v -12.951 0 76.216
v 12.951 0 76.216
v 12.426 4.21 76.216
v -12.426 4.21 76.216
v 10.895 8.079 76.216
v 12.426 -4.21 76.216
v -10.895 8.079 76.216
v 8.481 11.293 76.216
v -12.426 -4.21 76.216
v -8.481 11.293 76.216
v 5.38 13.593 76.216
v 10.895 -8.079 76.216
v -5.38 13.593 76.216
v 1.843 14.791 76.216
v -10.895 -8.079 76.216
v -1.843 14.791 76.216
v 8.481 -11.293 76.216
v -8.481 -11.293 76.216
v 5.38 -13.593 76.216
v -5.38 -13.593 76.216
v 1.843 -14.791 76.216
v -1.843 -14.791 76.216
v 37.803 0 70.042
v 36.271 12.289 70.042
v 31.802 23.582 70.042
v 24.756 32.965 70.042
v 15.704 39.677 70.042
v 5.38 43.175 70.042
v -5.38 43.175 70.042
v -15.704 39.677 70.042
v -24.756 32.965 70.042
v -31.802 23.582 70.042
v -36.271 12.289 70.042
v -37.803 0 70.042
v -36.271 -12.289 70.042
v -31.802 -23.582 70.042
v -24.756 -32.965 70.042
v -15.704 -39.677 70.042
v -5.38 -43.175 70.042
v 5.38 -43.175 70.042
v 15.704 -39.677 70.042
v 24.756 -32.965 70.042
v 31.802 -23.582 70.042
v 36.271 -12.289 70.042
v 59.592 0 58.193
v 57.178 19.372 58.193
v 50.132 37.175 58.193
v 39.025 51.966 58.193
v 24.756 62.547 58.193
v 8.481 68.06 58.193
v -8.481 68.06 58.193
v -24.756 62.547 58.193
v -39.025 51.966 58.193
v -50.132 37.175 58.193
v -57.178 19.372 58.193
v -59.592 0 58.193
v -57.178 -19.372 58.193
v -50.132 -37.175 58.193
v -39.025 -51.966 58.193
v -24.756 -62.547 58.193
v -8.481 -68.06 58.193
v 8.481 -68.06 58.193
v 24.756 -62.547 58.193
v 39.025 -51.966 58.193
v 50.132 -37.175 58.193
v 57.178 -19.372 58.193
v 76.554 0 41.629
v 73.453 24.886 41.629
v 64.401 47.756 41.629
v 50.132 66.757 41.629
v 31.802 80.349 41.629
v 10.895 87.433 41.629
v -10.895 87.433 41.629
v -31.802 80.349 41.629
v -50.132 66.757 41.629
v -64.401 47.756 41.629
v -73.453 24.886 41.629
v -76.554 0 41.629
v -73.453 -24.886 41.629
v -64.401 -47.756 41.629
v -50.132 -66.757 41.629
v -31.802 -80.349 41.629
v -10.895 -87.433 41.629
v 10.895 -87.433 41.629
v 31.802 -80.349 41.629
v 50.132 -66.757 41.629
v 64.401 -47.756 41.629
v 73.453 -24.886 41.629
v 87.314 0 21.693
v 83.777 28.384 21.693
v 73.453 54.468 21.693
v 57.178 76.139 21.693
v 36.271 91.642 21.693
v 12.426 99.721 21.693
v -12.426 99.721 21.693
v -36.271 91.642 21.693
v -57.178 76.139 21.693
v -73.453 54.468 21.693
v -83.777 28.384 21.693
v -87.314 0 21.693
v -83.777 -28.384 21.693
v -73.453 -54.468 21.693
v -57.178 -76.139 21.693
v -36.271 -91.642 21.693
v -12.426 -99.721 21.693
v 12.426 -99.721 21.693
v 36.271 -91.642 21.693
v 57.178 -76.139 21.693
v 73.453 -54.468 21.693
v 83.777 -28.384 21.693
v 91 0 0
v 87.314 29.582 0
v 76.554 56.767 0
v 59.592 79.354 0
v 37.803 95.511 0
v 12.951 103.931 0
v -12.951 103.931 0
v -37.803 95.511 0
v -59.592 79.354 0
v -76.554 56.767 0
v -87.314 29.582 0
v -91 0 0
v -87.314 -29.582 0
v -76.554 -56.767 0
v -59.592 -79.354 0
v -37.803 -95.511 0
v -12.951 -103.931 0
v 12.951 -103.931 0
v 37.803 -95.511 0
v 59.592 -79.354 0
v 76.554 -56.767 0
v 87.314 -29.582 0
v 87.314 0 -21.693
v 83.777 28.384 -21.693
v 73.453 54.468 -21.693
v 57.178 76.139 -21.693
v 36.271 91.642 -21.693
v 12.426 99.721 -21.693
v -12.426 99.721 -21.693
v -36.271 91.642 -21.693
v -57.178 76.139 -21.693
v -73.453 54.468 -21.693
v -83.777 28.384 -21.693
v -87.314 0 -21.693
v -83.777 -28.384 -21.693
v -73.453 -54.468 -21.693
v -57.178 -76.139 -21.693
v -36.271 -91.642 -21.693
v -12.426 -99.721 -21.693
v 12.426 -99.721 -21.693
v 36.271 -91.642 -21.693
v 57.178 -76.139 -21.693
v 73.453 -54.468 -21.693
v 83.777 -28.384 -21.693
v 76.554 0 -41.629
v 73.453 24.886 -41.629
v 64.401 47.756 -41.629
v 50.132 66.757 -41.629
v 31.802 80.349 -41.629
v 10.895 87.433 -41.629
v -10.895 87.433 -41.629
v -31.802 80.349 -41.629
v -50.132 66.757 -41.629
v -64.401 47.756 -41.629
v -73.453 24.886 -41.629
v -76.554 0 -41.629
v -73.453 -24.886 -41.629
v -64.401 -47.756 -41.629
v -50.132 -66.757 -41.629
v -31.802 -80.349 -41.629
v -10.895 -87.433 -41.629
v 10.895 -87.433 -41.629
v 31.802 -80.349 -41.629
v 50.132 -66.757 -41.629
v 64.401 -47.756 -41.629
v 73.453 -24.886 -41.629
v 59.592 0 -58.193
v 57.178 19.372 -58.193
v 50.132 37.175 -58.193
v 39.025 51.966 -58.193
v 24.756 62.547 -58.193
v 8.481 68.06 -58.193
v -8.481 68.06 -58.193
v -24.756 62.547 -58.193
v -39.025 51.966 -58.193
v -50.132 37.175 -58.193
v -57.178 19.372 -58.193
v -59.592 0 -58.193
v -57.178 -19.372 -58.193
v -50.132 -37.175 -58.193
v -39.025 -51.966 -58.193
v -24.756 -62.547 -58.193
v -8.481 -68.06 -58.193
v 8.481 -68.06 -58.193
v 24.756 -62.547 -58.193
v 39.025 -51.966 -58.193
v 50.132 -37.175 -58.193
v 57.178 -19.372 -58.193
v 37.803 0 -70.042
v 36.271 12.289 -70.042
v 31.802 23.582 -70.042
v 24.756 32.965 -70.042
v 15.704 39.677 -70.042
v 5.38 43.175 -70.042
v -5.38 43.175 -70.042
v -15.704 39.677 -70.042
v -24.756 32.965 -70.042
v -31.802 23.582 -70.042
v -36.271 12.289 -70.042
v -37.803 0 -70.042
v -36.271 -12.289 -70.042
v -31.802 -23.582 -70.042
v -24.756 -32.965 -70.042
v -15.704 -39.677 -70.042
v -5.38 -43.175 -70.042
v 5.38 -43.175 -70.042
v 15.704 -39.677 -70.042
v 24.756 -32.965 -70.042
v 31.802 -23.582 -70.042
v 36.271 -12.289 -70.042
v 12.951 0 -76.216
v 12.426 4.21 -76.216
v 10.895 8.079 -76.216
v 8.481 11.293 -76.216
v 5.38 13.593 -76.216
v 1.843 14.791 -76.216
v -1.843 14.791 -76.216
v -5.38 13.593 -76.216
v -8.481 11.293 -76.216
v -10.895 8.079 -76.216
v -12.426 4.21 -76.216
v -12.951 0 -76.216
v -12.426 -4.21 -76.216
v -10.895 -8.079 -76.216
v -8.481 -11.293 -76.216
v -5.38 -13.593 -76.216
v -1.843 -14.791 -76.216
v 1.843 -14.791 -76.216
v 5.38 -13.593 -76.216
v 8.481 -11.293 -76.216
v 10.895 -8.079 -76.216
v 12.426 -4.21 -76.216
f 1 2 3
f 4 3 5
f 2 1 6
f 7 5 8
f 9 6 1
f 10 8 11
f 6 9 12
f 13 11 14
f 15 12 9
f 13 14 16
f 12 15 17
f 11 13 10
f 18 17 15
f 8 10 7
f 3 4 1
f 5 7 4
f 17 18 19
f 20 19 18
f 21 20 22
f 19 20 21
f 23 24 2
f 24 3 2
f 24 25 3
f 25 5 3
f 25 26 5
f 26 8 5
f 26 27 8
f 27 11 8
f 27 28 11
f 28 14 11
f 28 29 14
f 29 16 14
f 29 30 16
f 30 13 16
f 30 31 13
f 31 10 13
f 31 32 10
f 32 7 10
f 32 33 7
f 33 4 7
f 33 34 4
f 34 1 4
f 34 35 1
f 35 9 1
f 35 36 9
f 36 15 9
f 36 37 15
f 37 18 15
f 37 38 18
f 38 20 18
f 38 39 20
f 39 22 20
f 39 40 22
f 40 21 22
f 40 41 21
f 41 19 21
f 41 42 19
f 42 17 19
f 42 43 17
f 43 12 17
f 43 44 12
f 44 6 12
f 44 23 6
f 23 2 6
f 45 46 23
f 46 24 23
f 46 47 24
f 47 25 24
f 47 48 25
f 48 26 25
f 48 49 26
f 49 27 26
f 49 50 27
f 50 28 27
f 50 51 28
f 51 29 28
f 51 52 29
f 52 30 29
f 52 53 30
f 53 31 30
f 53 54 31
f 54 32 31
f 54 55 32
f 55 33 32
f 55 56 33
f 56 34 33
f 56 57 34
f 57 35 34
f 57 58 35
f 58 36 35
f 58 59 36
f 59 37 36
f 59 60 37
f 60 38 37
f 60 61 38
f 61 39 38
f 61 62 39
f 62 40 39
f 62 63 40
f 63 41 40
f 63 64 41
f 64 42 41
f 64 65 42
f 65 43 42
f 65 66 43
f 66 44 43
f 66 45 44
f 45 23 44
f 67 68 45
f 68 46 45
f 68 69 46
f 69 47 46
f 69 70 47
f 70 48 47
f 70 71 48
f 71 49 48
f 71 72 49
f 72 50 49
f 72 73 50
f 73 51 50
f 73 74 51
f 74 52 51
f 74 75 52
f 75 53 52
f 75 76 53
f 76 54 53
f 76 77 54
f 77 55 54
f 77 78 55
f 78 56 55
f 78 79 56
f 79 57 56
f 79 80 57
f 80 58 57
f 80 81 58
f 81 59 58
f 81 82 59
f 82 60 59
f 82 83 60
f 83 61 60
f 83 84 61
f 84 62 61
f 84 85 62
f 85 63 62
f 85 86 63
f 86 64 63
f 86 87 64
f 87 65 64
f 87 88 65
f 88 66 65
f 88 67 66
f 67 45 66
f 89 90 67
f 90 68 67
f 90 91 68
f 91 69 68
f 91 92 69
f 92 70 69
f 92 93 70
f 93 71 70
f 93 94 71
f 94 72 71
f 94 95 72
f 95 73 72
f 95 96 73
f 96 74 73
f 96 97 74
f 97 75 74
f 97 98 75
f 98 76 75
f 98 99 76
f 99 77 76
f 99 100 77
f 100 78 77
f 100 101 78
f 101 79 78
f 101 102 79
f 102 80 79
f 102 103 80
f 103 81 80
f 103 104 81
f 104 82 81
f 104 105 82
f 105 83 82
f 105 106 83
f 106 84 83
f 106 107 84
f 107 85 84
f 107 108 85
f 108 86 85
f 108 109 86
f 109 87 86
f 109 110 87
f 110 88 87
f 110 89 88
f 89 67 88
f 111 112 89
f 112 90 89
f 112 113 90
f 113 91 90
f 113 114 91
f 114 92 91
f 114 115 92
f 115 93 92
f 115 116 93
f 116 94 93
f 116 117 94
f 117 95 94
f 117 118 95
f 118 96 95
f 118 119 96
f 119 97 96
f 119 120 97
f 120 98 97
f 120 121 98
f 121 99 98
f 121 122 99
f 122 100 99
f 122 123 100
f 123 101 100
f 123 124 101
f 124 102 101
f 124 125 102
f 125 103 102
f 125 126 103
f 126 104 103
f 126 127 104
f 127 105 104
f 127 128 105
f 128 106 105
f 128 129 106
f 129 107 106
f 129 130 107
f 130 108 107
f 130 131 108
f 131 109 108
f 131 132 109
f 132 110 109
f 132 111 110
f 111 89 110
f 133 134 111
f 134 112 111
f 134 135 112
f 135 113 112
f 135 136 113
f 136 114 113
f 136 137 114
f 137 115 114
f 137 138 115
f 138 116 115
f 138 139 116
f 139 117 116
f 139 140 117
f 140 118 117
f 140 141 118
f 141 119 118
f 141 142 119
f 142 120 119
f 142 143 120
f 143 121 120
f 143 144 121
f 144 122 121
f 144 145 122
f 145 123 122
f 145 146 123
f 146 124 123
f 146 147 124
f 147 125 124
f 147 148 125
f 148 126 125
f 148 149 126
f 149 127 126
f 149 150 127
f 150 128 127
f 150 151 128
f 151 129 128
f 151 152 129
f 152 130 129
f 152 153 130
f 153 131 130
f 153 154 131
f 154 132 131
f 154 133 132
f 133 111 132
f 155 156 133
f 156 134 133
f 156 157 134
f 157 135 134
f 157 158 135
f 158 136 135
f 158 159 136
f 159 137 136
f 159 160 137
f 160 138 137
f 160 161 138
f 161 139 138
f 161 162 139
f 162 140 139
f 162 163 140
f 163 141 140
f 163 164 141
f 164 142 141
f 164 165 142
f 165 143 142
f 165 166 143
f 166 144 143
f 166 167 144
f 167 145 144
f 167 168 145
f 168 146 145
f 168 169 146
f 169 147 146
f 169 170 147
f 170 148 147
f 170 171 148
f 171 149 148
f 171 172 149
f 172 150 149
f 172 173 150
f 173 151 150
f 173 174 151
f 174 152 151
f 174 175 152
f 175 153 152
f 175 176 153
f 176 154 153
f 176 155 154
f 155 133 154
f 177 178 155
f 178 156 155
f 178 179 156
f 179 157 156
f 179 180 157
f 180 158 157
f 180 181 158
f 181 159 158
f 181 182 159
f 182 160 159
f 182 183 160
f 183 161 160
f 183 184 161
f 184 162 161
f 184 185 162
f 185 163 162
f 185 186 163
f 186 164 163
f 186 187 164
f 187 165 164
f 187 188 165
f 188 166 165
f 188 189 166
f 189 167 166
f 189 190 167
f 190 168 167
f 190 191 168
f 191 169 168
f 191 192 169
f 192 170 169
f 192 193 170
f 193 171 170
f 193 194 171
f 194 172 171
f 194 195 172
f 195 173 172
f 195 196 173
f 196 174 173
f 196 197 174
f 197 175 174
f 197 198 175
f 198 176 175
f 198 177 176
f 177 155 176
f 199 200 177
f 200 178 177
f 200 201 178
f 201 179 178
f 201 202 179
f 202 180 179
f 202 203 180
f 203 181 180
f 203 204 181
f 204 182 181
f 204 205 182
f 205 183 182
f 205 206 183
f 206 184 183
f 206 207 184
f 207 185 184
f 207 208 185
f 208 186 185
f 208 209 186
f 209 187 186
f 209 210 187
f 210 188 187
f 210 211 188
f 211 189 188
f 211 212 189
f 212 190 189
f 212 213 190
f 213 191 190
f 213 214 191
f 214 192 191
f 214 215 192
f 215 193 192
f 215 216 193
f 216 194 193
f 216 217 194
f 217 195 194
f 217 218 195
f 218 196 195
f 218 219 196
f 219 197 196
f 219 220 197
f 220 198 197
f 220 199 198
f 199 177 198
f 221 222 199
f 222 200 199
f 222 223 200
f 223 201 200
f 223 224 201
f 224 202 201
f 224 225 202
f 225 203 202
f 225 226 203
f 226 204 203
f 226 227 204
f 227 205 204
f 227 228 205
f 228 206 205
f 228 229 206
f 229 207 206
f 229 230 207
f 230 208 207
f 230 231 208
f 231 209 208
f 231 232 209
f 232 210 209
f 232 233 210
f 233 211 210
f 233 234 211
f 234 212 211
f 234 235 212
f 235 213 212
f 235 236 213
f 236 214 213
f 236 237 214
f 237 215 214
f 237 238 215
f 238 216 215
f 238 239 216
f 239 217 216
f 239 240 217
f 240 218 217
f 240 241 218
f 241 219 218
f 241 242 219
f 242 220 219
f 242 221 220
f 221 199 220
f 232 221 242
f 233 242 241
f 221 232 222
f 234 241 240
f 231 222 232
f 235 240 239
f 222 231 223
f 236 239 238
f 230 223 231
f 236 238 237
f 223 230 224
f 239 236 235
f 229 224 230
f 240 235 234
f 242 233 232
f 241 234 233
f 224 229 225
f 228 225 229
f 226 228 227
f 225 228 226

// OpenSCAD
// Generated by SolidPython 1.0.1 on 2020-07-29 00:46:51


scale(v = [13, 15, 11]) {
	sphere(r = 7);
}
/***********************************************
*********      SolidPython code:      **********
************************************************
 
# import packages: SolidPython
from solid import *
from solid.utils import *
from itertools import chain, combinations, permutations


class Resize:

    def __init__(self, scad_file):
        self.scad_file = scad_file
        #self.scad_file = import_scad(scad_file)
        # cone/cylinder param:
        self.r1 = 0
        self.r2 = 0
        self.h = 0
        # rectangular prism param:
        self.w = 0
        self.l = 0
        # ellipse param:
        self.r = 0

    # import OpenScad code (file name corresponds to shape)


    # classify shape + parameters
    def assign(self, param1, param2, param3):
        if self.scad_file == 'cone.scad':
            self.r1 = param1
            self.r2 = param2
            self.h = param3
        elif self.scad_file == 'cylinder.scad':
            self.r1 = param1
            self.r2 = param2
            self.h = param3
        elif self.scad_file == 'rectangularPrism.scad':
            self.h = param1
            self.l = param2
            self.w = param3
        else:
            self.r = param1
            self.h = param2

    # resize parameters
    def iterate(self):
        x = range(3, 20, 2)
        i = 1
        if self.scad_file == 'cone.scad':
            tempList = list(permutations(x, 2))
            for temp in tempList:
                param1 = temp[0]
                param2 = temp[1]
                filepath = 'produced_scad_files/' + 'cone' + str(param1) + '_' + str(param2) + '_' + '.scad'
                scad_render_to_file(cylinder(h=param1, r1=param2, r2=0), filepath)

        elif self.scad_file == 'cylinder.scad':
            tempList = list(permutations(x, 3))
            for temp in tempList:
                param1 = temp[0]
                param2 = temp[1]
                filepath = 'produced_scad_files/' + 'cylinder' + str(param1) + '_' + str(param2) + '_' + '.scad'
                scad_render_to_file(cylinder(h=param1, r1=param2, r2=param2), filepath)

        elif self.scad_file == 'rectangularPrism.scad':
            tempList = list(permutations(x, 3))
            for temp in tempList:
                param1 = temp[0]
                param2 = temp[1]
                param3 = temp[2]
                filepath = 'produced_scad_files/' + 'rectangularPrism' + str(param1) + '_' + str(param2) + '_' + str(
                    param3) + '.scad'
                scad_render_to_file(cube(size=(param1, param2, param3)), filepath)

        elif self.scad_file == 'ellipse.scad':
            tempList = list(permutations(x, 4))
            for temp in tempList:
                param1 = temp[0]
                param2 = temp[1]
                param3 = temp[2]
                param4 = temp[3]
                filepath = 'produced_scad_files/' + 'ellipse' + str(param1) + '_' + str(param2) + '_' + str(param3) + '_' + str(param4) + '.scad'
                scad_render_to_file(scale([param1, param2, param3])(sphere(r=param4)), filepath)

    def render_to_scadfile(self):
        scad_render_to_file(scad, 'example.scad') 
 
************************************************/
